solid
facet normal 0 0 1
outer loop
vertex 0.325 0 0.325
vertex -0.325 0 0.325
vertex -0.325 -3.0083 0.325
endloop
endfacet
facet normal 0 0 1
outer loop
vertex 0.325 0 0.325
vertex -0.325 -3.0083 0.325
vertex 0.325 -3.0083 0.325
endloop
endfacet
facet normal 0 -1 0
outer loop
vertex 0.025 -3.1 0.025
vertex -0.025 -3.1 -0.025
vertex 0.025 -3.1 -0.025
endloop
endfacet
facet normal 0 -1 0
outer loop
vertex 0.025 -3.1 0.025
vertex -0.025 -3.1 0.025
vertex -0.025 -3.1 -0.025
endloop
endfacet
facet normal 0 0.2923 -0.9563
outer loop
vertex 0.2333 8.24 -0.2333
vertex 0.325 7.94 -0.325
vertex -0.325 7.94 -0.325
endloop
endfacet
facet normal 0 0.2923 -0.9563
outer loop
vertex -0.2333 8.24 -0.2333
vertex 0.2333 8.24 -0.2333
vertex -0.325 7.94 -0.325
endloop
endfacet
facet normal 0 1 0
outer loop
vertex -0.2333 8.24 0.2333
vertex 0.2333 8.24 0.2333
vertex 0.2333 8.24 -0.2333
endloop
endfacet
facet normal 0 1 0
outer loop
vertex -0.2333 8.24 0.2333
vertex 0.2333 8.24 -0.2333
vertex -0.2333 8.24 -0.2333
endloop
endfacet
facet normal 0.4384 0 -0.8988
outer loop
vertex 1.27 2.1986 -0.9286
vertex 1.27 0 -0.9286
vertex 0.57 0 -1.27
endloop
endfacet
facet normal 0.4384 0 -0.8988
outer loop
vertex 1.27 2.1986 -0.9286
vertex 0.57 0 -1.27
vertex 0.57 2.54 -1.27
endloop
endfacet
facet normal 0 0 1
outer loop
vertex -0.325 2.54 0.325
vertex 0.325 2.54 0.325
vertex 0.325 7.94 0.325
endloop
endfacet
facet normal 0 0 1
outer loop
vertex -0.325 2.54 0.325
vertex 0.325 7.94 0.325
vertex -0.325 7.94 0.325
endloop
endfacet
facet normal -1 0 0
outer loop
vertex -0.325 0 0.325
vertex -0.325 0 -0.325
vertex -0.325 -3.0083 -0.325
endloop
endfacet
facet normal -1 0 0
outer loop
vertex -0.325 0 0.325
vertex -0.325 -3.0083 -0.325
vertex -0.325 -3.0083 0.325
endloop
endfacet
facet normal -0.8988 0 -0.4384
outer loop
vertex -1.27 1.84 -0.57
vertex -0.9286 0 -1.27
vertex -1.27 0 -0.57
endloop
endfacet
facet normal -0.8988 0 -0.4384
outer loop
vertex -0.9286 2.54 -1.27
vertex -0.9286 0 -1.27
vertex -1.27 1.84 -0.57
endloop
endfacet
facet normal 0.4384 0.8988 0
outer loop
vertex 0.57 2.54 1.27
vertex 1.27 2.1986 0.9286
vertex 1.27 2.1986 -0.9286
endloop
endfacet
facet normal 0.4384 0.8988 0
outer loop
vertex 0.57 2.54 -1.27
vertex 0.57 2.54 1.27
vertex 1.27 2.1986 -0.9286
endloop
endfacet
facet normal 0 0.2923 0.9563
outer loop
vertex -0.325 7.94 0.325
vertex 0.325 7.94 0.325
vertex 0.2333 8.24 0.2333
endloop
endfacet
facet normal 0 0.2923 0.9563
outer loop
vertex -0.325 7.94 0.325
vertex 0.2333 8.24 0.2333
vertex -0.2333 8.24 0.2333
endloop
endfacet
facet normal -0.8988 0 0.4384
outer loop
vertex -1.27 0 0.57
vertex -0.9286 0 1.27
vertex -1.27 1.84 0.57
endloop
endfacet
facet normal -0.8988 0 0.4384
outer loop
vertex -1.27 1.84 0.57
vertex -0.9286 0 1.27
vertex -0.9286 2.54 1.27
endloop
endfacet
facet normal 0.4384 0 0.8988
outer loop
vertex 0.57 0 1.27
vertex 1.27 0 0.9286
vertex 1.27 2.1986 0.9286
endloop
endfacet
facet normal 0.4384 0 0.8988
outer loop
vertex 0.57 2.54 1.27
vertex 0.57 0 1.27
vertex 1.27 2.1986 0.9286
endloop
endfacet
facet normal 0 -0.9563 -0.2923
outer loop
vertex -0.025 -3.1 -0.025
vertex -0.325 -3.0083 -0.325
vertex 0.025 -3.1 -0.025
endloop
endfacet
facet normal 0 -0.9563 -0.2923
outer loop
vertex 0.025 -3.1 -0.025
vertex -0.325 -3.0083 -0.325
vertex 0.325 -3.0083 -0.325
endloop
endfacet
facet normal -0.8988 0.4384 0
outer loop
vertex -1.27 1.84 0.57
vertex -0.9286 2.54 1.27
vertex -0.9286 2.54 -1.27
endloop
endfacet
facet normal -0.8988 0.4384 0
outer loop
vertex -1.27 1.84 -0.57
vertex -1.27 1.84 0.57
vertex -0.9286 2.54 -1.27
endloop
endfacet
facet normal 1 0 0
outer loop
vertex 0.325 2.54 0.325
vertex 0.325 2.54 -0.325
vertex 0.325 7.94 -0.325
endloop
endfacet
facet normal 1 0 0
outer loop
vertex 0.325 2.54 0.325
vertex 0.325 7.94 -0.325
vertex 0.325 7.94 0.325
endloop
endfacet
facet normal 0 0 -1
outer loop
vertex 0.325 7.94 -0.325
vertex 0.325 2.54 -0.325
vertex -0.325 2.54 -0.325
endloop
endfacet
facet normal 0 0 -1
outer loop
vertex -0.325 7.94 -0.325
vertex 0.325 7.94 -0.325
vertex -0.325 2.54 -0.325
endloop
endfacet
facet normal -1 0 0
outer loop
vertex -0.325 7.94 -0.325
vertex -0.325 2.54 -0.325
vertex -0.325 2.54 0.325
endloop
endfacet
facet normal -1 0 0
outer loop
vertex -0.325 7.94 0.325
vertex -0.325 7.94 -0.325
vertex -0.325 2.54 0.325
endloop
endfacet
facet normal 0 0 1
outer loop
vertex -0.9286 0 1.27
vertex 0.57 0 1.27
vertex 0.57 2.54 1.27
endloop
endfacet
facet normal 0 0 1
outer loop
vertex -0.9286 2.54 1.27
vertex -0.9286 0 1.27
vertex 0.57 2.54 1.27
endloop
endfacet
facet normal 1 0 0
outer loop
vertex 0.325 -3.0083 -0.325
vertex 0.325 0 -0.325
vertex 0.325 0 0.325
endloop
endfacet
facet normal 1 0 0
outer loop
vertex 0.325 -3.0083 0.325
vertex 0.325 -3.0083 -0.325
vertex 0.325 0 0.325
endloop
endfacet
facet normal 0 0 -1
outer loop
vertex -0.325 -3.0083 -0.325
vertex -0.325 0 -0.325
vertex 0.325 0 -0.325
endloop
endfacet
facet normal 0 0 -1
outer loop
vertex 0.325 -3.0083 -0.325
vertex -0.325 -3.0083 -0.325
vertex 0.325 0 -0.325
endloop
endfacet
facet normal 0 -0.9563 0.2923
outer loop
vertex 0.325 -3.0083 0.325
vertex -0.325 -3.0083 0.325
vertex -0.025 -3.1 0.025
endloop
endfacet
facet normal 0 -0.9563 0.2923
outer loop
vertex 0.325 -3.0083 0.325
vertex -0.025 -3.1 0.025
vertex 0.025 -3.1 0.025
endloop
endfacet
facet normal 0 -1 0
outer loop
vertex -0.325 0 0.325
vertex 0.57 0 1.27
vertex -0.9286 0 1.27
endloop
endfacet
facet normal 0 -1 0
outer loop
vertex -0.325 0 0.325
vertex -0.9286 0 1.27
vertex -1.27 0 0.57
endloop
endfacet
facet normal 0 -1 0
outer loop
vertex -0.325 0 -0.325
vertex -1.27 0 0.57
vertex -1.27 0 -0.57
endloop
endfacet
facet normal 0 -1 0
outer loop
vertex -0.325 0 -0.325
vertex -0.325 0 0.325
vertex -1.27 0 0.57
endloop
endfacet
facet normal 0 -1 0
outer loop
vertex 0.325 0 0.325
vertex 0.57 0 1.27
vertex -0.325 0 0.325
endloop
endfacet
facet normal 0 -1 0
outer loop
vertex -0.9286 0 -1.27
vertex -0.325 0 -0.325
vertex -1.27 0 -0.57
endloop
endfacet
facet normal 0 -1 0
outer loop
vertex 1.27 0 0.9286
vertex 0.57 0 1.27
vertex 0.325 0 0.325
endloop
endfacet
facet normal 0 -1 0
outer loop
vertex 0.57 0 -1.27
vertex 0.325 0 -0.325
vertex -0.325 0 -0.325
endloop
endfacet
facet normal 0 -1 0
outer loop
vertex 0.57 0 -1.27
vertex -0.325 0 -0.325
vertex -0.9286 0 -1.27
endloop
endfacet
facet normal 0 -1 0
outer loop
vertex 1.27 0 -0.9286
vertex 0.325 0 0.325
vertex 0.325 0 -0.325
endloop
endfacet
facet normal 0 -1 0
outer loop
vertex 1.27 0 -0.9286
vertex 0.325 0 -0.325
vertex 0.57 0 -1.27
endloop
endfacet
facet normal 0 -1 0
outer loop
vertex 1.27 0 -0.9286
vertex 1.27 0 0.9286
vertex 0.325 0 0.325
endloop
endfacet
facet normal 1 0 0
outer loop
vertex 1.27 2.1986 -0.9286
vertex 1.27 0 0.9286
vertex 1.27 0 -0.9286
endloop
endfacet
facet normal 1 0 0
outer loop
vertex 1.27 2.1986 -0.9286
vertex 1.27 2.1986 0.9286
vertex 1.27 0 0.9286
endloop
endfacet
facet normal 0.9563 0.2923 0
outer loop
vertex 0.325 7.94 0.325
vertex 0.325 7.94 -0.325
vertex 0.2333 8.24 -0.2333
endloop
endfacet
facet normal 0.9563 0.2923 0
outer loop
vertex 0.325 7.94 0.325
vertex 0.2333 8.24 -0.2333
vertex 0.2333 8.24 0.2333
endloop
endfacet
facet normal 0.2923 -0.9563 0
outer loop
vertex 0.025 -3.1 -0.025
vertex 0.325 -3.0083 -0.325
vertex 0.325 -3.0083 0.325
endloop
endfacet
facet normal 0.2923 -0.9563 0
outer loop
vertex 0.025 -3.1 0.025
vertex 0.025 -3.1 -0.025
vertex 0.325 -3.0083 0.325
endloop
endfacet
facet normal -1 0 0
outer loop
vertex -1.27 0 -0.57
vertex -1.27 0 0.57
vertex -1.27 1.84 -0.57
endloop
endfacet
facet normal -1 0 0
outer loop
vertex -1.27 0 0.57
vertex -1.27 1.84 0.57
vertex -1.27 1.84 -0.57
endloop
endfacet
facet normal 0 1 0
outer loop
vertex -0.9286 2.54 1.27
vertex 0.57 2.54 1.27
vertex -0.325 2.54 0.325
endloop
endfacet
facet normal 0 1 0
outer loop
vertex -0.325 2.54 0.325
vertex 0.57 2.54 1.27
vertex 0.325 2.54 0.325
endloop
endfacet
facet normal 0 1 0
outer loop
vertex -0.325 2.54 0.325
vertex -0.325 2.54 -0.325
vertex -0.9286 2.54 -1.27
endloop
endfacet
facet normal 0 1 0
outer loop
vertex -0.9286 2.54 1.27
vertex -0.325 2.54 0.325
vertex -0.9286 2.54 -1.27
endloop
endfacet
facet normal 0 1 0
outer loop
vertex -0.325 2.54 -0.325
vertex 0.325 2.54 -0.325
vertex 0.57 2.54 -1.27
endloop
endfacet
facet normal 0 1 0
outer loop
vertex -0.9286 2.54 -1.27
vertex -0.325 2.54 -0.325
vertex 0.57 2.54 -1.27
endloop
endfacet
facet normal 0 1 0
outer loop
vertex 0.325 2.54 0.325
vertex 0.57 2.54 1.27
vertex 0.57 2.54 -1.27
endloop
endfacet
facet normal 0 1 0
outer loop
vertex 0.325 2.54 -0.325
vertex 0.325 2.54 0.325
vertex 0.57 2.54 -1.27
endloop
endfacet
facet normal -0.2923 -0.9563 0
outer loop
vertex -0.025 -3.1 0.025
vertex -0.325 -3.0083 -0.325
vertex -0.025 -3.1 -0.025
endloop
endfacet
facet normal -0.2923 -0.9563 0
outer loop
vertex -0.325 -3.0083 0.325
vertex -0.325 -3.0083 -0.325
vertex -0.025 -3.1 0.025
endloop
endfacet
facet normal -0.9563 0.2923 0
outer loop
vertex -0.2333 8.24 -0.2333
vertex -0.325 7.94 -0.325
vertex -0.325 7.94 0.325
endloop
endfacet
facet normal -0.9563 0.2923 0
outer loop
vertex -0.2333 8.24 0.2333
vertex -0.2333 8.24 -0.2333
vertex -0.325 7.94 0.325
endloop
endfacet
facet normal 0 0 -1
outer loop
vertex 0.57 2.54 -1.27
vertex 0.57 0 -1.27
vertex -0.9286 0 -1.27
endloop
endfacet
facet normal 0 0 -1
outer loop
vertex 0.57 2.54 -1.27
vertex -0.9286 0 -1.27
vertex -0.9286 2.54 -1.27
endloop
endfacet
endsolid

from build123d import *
from OCP.BRepFilletAPI import BRepFilletAPI_MakeChamfer

# Parameters (mm, degrees)
SKETCH1_W           = 2.54
SKETCH1_H           = 2.54
BOSS_EXTRUDE1_DEPTH = 2.54
SKETCH2_W           = 0.65
SKETCH2_H           = 0.65
BOSS_EXTRUDE2_DEPTH = 5.7
SKETCH3_W           = 0.65
SKETCH3_H           = 0.65
BOSS_EXTRUDE3_DEPTH = 3.1
CHAMFER1_SIZE       = 0.091719204
CHAMFER1_SIZE2      = 0.3
CHAMFER2_SIZE       = 0.3
CHAMFER2_SIZE2      = 0.091719204
CHAMFER3_SIZE       = 0.7
CHAMFER3_SIZE2      = 0.341412812


with BuildPart() as part:
    # Sketch1 → Boss-Extrude1 (new body)
    with BuildSketch(Plane(origin=(1.27, 0, 0), x_dir=(0, 0, -1), z_dir=(1, 0, 0))):
        with Locations((0, 1.27)):
            Rectangle(SKETCH1_W, SKETCH1_H)
    extrude(amount=-BOSS_EXTRUDE1_DEPTH)

    # Sketch2 → Boss-Extrude2 (add)
    with BuildSketch(Plane(origin=(0, 2.54, 0), x_dir=(-1, 0, 0), z_dir=(0, 1, 0))):
        Rectangle(SKETCH2_W, SKETCH2_H)
    extrude(amount=BOSS_EXTRUDE2_DEPTH)

    # Sketch3 → Boss-Extrude3 (add)
    with BuildSketch(Plane.XZ):
        Rectangle(SKETCH3_W, SKETCH3_H)
    extrude(amount=BOSS_EXTRUDE3_DEPTH)

    # Chamfer1
    chamfer1_edges = [part.edges().sort_by_distance(p)[0] for p in [
        (0.325, 8.24, 0),
        (0, 8.24, -0.325),
        (-0.325, 8.24, 0),
        (0, 8.24, 0.325),
    ]]
    chamfer1_side = [part.faces().sort_by_distance(p)[0] for p in [
        (0, 8.24, 0),
    ]]
    chamfer(chamfer1_edges, length=CHAMFER1_SIZE, length2=CHAMFER1_SIZE2, reference=chamfer1_side[0])

    # Chamfer2
    chamfer2_edges = [part.edges().sort_by_distance(p)[0] for p in [
        (0, -3.1, -0.325),
        (0.325, -3.1, 0),
        (0, -3.1, 0.325),
        (-0.325, -3.1, 0),
    ]]
    chamfer2_side = [part.faces().sort_by_distance(p)[0] for p in [
        (0, -3.1, 0),
    ]]
    chamfer(chamfer2_edges, length=CHAMFER2_SIZE, length2=CHAMFER2_SIZE2, reference=chamfer2_side[0])

    # Chamfer3: one chamfer whose edges measure the first distance from different faces: ONE call of the kernel's chamfer builder (chamfer() names one face for all edges)
    chamfer3_edges_1 = [part.edges().sort_by_distance(p)[0] for p in [
        (-1.27, 1.27, -1.27),
        (-1.27, 2.54, 0),
        (-1.27, 1.27, 1.27),
    ]]
    chamfer3_side_1 = [part.faces().sort_by_distance(p)[0] for p in [
        (-1.27, 1.27, 0),
    ]]
    chamfer3_edges_2 = [part.edges().sort_by_distance(p)[0] for p in [
        (1.27, 2.54, 0),
    ]]
    chamfer3_side_2 = [part.faces().sort_by_distance(p)[0] for p in [
        (0, 2.54, -1.234078976),
    ]]
    chamfer3_edges_3 = [part.edges().sort_by_distance(p)[0] for p in [
        (1.27, 1.27, -1.27),
    ]]
    chamfer3_side_3 = [part.faces().sort_by_distance(p)[0] for p in [
        (0, 1.27, -1.27),
    ]]
    chamfer3_edges_4 = [part.edges().sort_by_distance(p)[0] for p in [
        (1.27, 1.27, 1.27),
    ]]
    chamfer3_side_4 = [part.faces().sort_by_distance(p)[0] for p in [
        (0, 1.27, 1.27),
    ]]
    chamfer3 = BRepFilletAPI_MakeChamfer(part.part.solid().wrapped)
    for e in chamfer3_edges_1:
        chamfer3.Add(CHAMFER3_SIZE, CHAMFER3_SIZE2, e.wrapped, chamfer3_side_1[0].wrapped)  # the first distance lies on this face
    for e in chamfer3_edges_2:
        chamfer3.Add(CHAMFER3_SIZE, CHAMFER3_SIZE2, e.wrapped, chamfer3_side_2[0].wrapped)  # the first distance lies on this face
    for e in chamfer3_edges_3:
        chamfer3.Add(CHAMFER3_SIZE, CHAMFER3_SIZE2, e.wrapped, chamfer3_side_3[0].wrapped)  # the first distance lies on this face
    for e in chamfer3_edges_4:
        chamfer3.Add(CHAMFER3_SIZE, CHAMFER3_SIZE2, e.wrapped, chamfer3_side_4[0].wrapped)  # the first distance lies on this face
    add(Compound.cast(chamfer3.Shape()), mode=Mode.REPLACE)


solid = part.part
